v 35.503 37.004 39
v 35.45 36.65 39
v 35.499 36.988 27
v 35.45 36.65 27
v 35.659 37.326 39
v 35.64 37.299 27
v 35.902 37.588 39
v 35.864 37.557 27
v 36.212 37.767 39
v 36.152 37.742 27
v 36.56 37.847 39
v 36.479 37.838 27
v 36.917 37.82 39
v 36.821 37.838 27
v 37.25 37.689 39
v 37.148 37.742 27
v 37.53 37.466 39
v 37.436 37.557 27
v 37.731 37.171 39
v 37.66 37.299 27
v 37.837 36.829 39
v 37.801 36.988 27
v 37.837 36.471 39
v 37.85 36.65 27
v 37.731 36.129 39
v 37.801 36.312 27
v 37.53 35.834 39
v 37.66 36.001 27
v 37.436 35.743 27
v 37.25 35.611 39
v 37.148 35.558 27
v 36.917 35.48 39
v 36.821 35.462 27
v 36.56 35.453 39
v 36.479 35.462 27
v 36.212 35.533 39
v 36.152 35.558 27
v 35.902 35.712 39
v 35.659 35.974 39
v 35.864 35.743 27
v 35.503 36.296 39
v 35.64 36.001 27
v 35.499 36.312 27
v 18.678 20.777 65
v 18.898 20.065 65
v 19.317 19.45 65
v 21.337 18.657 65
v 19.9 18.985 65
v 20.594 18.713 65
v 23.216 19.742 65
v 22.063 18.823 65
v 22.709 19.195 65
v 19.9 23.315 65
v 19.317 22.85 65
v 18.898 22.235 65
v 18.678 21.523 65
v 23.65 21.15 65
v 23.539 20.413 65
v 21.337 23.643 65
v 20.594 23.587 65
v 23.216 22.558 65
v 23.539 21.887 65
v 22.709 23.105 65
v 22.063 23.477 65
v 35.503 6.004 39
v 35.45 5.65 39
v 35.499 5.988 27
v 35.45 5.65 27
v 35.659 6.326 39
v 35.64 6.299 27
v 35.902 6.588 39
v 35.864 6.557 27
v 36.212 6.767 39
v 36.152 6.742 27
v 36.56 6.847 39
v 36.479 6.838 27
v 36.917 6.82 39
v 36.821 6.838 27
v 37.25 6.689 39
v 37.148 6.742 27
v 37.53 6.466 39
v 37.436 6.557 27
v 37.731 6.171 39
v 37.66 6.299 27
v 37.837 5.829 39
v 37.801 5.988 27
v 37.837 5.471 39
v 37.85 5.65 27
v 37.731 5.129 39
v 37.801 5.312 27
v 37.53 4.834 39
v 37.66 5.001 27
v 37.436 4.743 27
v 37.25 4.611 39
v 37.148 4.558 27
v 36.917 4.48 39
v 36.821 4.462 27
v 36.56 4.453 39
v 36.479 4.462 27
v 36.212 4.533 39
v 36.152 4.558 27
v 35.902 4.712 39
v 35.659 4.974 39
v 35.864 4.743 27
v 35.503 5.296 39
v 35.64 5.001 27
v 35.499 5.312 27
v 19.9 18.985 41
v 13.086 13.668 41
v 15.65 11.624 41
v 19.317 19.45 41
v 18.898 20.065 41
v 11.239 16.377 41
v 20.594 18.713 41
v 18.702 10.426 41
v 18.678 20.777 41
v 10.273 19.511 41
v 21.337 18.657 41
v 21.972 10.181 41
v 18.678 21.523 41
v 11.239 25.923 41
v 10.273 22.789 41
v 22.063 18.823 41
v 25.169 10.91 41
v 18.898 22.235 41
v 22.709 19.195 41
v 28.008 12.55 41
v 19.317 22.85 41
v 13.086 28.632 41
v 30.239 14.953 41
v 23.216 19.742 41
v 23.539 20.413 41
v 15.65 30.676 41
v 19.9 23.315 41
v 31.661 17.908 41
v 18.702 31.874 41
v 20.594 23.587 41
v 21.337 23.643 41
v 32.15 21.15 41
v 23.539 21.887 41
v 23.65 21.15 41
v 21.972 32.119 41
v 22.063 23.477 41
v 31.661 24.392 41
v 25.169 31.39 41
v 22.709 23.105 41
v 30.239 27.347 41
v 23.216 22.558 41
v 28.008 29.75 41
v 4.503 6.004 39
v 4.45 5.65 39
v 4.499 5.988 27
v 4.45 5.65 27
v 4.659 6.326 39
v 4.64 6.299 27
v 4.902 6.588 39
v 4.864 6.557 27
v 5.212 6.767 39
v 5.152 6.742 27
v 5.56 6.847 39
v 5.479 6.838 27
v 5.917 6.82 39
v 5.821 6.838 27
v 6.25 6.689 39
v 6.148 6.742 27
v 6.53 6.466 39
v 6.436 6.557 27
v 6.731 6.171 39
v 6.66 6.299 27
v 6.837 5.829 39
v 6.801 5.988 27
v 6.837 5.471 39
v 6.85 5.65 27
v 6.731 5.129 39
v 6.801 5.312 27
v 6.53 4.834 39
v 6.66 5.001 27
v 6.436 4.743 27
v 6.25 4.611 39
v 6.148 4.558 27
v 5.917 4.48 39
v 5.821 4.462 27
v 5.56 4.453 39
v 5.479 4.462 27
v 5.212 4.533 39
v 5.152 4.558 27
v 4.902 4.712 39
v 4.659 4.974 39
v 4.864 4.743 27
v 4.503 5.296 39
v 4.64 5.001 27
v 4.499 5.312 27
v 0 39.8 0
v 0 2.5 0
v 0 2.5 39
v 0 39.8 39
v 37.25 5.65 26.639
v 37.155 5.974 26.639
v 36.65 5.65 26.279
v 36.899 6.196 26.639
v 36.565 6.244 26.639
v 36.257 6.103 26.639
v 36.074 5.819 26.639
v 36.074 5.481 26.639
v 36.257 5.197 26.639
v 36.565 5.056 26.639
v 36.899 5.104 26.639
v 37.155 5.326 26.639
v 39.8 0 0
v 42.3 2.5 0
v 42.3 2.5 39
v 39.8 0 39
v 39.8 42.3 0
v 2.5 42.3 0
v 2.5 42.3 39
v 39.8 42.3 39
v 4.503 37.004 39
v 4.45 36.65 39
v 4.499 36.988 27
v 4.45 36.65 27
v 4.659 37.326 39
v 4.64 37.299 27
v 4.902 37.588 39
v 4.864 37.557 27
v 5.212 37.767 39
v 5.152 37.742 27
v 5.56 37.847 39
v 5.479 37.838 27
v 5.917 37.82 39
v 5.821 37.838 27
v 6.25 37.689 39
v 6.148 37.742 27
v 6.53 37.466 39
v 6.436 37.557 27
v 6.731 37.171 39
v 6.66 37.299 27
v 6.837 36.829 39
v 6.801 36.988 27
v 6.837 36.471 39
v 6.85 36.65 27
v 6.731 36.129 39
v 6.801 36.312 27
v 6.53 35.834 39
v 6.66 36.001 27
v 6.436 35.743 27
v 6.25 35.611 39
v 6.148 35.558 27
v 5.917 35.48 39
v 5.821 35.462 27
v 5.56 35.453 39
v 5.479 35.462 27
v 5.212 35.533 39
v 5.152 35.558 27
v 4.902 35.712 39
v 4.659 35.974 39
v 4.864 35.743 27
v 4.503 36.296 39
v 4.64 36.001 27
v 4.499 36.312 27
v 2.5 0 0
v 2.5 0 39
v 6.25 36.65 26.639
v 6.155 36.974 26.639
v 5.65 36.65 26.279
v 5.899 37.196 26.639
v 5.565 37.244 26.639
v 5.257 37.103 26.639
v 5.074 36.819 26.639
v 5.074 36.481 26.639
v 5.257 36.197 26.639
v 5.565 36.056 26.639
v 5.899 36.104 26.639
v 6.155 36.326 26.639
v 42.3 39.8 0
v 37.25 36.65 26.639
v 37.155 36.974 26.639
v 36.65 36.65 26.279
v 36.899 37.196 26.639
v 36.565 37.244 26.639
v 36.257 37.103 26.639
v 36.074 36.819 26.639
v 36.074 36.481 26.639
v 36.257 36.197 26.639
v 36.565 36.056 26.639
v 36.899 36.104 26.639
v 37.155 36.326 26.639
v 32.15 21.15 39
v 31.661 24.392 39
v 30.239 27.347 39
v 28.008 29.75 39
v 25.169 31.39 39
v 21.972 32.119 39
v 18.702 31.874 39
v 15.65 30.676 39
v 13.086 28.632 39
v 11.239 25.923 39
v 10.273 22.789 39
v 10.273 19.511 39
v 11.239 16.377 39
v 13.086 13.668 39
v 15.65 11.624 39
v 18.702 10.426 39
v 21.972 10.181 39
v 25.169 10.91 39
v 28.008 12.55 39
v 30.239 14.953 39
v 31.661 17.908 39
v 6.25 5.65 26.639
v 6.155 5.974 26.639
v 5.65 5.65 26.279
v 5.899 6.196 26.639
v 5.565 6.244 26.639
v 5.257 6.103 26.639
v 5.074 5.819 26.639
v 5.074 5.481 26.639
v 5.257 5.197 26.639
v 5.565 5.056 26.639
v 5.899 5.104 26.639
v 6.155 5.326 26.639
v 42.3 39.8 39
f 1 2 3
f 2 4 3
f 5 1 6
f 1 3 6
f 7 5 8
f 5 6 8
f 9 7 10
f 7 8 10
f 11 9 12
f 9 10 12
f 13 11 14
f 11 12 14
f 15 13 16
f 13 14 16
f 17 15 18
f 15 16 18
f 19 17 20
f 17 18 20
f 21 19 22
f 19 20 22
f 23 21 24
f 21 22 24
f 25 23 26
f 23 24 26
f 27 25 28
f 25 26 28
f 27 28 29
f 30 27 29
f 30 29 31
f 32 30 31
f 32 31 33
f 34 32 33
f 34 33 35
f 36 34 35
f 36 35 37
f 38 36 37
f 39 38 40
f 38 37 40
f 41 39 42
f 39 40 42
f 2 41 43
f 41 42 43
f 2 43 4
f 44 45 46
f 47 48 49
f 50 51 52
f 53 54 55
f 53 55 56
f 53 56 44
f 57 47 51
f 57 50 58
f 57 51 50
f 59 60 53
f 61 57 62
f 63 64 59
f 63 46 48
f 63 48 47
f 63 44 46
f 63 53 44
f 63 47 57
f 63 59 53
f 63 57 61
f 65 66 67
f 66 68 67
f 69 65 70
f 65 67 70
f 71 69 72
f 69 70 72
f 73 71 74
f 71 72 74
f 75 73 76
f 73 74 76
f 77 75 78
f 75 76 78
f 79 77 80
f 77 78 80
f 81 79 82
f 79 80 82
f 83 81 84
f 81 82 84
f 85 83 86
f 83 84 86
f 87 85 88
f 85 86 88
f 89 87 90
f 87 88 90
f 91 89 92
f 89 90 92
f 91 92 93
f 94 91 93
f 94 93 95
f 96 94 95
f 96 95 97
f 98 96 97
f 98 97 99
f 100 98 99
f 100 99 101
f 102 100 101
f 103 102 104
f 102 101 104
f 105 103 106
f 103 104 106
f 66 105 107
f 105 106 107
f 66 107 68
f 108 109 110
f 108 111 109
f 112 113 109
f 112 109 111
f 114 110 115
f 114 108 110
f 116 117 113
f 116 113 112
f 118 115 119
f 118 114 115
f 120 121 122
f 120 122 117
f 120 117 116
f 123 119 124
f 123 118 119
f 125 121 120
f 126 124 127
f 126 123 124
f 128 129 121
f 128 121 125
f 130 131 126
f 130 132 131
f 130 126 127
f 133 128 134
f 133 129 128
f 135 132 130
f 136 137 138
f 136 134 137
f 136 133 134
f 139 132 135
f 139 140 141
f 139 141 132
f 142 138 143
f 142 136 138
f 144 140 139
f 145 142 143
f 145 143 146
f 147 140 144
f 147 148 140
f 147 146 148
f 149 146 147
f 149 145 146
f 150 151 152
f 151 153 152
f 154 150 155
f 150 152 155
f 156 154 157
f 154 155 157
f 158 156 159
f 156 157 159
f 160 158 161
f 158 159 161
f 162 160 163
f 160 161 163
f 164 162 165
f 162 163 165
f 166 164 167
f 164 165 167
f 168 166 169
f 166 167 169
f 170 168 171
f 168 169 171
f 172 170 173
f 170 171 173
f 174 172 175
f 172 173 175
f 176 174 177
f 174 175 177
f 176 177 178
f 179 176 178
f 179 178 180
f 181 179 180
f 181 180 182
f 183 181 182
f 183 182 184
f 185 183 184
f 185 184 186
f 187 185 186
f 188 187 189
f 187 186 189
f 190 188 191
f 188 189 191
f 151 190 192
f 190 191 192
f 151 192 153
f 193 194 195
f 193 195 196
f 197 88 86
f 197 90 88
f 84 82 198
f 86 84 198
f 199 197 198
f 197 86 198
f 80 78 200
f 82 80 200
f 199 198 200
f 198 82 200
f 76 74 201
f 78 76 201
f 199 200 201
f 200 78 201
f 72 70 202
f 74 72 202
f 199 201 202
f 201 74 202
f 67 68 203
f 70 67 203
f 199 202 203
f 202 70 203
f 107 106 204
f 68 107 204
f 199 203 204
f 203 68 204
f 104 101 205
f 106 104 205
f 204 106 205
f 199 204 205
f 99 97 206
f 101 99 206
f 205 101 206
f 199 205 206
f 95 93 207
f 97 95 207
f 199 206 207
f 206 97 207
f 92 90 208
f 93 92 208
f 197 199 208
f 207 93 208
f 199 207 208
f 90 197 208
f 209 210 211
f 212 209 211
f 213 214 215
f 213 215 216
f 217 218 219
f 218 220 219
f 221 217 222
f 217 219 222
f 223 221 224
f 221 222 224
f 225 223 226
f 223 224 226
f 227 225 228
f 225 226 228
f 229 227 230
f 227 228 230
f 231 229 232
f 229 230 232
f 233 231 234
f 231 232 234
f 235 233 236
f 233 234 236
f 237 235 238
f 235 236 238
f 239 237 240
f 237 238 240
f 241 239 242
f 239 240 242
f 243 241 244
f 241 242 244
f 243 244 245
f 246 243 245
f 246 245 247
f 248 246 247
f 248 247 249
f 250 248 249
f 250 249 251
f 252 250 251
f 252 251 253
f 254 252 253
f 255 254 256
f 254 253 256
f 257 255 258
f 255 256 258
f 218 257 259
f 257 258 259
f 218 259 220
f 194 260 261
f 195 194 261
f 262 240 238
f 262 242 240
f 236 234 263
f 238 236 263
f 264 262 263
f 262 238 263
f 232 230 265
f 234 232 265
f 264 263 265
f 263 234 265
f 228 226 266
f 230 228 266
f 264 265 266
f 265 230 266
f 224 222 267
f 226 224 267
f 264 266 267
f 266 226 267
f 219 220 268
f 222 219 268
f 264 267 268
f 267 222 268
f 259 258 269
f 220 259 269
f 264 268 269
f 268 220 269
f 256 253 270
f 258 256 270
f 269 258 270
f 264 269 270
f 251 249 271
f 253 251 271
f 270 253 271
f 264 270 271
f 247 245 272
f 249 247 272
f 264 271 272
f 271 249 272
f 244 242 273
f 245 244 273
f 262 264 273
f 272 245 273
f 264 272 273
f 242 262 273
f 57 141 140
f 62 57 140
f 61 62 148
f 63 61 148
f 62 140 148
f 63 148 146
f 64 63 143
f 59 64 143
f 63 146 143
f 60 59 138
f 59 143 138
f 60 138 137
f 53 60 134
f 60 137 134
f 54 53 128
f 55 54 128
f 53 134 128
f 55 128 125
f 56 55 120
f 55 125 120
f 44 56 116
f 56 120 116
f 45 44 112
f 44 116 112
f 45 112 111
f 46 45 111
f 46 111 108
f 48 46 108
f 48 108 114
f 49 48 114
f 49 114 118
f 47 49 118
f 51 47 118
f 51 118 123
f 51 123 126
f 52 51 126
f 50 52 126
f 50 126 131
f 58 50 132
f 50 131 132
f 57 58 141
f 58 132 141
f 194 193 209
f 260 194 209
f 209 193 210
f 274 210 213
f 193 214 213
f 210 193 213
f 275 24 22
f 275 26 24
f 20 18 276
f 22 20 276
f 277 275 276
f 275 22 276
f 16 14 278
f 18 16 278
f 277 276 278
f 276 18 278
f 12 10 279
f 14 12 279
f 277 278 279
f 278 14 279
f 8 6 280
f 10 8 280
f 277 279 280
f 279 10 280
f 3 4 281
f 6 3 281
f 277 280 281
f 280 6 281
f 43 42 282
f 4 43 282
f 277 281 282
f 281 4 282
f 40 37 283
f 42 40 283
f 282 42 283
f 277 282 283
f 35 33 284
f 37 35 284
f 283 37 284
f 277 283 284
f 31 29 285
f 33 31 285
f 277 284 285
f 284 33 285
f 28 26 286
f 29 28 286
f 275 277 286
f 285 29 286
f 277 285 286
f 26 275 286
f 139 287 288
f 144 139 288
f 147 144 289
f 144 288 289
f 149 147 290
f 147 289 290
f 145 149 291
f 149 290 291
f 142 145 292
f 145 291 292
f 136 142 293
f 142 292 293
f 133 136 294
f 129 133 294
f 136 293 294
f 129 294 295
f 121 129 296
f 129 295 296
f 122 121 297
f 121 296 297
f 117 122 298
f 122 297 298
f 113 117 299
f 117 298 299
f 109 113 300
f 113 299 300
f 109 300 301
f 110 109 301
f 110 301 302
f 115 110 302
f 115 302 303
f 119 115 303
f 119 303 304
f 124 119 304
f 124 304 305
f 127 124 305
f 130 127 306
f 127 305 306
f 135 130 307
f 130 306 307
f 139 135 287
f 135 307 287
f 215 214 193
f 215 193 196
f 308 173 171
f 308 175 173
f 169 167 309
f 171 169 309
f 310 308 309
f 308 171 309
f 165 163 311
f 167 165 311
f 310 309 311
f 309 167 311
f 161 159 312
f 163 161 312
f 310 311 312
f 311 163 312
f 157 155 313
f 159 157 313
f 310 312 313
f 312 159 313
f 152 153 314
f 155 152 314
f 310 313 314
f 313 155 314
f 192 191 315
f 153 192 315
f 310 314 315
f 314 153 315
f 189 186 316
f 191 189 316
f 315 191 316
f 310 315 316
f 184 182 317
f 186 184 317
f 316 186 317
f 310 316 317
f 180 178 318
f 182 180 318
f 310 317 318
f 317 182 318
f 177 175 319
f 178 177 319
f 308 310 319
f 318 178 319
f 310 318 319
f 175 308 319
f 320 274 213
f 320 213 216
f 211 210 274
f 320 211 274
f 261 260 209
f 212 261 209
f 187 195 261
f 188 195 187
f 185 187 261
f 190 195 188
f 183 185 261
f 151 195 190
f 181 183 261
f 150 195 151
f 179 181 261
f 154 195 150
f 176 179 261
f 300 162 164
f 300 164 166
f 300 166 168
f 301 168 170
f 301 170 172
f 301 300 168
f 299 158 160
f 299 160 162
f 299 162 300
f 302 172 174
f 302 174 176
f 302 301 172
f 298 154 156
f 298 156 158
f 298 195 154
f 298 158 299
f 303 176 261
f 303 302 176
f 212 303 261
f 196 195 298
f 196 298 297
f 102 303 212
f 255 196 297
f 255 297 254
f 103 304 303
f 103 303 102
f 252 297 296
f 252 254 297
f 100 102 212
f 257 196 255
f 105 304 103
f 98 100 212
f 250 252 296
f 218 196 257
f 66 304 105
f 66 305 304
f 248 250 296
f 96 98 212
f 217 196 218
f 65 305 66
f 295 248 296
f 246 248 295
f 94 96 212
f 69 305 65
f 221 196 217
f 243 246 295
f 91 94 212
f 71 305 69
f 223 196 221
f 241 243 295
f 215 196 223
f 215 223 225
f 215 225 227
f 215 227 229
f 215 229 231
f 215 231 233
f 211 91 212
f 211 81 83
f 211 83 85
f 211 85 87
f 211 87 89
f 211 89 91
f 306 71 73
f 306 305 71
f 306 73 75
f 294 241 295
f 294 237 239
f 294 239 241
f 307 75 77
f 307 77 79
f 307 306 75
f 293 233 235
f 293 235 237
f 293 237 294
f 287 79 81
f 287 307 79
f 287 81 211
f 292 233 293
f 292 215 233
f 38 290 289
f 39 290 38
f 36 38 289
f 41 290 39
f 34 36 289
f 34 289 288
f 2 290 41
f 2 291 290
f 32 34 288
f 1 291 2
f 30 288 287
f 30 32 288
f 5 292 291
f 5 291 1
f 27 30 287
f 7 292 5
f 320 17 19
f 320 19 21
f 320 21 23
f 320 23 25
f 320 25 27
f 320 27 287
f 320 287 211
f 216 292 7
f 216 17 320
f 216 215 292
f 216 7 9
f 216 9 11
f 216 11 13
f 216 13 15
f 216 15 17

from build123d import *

# Parameters (mm, degrees)
F0_W     = 42.3
F0_H     = 42.3
F1_DEPTH = 39
F2_R     = 11
F3_DEPTH = 2
F4_R     = 2.5
F5_DEPTH = 24
F6_SIZE  = 2.5
F8_D     = 2.4
F8_DEPTH = 12
F8_TIP   = 0.7210327428


with BuildPart() as f1:
    # F0 (on Top) → F1 (new body)
    with BuildSketch(Plane.XY):
        with Locations((21.15, 21.15)):
            Rectangle(F0_W, F0_H)
    extrude(amount=F1_DEPTH)

    # F2 (on face) → F3 (join)
    with BuildSketch(Plane.XY.offset(39)):
        with Locations((21.15, 21.15)):
            Circle(F2_R)
    extrude(amount=F3_DEPTH)

    # F4 (on face) → F5 (join)
    with BuildSketch(Plane.XY.offset(41)):
        with Locations((21.15, 21.15)):
            Circle(F4_R)
    extrude(amount=F5_DEPTH)

    # F6
    f6_edges = [f1.edges().sort_by_distance(p)[0] for p in [
        (42.3, 0, 19.5),
        (42.3, 42.3, 19.5),
        (0, 0, 19.5),
        (0, 42.3, 19.5),
    ]]
    chamfer(f6_edges, length=F6_SIZE)

    # F8
    with Locations(Plane.XY.offset(39)):
        with Locations((5.65, 36.65), (36.65, 36.65), (36.65, 5.65), (5.65, 5.65)):
            Hole(F8_D / 2, depth=F8_DEPTH)
            with Locations((0, 0, -(F8_DEPTH + F8_TIP / 2))):  # 118° drill point
                Cone(0, F8_D / 2, F8_TIP, mode=Mode.SUBTRACT)


solid = f1.part
